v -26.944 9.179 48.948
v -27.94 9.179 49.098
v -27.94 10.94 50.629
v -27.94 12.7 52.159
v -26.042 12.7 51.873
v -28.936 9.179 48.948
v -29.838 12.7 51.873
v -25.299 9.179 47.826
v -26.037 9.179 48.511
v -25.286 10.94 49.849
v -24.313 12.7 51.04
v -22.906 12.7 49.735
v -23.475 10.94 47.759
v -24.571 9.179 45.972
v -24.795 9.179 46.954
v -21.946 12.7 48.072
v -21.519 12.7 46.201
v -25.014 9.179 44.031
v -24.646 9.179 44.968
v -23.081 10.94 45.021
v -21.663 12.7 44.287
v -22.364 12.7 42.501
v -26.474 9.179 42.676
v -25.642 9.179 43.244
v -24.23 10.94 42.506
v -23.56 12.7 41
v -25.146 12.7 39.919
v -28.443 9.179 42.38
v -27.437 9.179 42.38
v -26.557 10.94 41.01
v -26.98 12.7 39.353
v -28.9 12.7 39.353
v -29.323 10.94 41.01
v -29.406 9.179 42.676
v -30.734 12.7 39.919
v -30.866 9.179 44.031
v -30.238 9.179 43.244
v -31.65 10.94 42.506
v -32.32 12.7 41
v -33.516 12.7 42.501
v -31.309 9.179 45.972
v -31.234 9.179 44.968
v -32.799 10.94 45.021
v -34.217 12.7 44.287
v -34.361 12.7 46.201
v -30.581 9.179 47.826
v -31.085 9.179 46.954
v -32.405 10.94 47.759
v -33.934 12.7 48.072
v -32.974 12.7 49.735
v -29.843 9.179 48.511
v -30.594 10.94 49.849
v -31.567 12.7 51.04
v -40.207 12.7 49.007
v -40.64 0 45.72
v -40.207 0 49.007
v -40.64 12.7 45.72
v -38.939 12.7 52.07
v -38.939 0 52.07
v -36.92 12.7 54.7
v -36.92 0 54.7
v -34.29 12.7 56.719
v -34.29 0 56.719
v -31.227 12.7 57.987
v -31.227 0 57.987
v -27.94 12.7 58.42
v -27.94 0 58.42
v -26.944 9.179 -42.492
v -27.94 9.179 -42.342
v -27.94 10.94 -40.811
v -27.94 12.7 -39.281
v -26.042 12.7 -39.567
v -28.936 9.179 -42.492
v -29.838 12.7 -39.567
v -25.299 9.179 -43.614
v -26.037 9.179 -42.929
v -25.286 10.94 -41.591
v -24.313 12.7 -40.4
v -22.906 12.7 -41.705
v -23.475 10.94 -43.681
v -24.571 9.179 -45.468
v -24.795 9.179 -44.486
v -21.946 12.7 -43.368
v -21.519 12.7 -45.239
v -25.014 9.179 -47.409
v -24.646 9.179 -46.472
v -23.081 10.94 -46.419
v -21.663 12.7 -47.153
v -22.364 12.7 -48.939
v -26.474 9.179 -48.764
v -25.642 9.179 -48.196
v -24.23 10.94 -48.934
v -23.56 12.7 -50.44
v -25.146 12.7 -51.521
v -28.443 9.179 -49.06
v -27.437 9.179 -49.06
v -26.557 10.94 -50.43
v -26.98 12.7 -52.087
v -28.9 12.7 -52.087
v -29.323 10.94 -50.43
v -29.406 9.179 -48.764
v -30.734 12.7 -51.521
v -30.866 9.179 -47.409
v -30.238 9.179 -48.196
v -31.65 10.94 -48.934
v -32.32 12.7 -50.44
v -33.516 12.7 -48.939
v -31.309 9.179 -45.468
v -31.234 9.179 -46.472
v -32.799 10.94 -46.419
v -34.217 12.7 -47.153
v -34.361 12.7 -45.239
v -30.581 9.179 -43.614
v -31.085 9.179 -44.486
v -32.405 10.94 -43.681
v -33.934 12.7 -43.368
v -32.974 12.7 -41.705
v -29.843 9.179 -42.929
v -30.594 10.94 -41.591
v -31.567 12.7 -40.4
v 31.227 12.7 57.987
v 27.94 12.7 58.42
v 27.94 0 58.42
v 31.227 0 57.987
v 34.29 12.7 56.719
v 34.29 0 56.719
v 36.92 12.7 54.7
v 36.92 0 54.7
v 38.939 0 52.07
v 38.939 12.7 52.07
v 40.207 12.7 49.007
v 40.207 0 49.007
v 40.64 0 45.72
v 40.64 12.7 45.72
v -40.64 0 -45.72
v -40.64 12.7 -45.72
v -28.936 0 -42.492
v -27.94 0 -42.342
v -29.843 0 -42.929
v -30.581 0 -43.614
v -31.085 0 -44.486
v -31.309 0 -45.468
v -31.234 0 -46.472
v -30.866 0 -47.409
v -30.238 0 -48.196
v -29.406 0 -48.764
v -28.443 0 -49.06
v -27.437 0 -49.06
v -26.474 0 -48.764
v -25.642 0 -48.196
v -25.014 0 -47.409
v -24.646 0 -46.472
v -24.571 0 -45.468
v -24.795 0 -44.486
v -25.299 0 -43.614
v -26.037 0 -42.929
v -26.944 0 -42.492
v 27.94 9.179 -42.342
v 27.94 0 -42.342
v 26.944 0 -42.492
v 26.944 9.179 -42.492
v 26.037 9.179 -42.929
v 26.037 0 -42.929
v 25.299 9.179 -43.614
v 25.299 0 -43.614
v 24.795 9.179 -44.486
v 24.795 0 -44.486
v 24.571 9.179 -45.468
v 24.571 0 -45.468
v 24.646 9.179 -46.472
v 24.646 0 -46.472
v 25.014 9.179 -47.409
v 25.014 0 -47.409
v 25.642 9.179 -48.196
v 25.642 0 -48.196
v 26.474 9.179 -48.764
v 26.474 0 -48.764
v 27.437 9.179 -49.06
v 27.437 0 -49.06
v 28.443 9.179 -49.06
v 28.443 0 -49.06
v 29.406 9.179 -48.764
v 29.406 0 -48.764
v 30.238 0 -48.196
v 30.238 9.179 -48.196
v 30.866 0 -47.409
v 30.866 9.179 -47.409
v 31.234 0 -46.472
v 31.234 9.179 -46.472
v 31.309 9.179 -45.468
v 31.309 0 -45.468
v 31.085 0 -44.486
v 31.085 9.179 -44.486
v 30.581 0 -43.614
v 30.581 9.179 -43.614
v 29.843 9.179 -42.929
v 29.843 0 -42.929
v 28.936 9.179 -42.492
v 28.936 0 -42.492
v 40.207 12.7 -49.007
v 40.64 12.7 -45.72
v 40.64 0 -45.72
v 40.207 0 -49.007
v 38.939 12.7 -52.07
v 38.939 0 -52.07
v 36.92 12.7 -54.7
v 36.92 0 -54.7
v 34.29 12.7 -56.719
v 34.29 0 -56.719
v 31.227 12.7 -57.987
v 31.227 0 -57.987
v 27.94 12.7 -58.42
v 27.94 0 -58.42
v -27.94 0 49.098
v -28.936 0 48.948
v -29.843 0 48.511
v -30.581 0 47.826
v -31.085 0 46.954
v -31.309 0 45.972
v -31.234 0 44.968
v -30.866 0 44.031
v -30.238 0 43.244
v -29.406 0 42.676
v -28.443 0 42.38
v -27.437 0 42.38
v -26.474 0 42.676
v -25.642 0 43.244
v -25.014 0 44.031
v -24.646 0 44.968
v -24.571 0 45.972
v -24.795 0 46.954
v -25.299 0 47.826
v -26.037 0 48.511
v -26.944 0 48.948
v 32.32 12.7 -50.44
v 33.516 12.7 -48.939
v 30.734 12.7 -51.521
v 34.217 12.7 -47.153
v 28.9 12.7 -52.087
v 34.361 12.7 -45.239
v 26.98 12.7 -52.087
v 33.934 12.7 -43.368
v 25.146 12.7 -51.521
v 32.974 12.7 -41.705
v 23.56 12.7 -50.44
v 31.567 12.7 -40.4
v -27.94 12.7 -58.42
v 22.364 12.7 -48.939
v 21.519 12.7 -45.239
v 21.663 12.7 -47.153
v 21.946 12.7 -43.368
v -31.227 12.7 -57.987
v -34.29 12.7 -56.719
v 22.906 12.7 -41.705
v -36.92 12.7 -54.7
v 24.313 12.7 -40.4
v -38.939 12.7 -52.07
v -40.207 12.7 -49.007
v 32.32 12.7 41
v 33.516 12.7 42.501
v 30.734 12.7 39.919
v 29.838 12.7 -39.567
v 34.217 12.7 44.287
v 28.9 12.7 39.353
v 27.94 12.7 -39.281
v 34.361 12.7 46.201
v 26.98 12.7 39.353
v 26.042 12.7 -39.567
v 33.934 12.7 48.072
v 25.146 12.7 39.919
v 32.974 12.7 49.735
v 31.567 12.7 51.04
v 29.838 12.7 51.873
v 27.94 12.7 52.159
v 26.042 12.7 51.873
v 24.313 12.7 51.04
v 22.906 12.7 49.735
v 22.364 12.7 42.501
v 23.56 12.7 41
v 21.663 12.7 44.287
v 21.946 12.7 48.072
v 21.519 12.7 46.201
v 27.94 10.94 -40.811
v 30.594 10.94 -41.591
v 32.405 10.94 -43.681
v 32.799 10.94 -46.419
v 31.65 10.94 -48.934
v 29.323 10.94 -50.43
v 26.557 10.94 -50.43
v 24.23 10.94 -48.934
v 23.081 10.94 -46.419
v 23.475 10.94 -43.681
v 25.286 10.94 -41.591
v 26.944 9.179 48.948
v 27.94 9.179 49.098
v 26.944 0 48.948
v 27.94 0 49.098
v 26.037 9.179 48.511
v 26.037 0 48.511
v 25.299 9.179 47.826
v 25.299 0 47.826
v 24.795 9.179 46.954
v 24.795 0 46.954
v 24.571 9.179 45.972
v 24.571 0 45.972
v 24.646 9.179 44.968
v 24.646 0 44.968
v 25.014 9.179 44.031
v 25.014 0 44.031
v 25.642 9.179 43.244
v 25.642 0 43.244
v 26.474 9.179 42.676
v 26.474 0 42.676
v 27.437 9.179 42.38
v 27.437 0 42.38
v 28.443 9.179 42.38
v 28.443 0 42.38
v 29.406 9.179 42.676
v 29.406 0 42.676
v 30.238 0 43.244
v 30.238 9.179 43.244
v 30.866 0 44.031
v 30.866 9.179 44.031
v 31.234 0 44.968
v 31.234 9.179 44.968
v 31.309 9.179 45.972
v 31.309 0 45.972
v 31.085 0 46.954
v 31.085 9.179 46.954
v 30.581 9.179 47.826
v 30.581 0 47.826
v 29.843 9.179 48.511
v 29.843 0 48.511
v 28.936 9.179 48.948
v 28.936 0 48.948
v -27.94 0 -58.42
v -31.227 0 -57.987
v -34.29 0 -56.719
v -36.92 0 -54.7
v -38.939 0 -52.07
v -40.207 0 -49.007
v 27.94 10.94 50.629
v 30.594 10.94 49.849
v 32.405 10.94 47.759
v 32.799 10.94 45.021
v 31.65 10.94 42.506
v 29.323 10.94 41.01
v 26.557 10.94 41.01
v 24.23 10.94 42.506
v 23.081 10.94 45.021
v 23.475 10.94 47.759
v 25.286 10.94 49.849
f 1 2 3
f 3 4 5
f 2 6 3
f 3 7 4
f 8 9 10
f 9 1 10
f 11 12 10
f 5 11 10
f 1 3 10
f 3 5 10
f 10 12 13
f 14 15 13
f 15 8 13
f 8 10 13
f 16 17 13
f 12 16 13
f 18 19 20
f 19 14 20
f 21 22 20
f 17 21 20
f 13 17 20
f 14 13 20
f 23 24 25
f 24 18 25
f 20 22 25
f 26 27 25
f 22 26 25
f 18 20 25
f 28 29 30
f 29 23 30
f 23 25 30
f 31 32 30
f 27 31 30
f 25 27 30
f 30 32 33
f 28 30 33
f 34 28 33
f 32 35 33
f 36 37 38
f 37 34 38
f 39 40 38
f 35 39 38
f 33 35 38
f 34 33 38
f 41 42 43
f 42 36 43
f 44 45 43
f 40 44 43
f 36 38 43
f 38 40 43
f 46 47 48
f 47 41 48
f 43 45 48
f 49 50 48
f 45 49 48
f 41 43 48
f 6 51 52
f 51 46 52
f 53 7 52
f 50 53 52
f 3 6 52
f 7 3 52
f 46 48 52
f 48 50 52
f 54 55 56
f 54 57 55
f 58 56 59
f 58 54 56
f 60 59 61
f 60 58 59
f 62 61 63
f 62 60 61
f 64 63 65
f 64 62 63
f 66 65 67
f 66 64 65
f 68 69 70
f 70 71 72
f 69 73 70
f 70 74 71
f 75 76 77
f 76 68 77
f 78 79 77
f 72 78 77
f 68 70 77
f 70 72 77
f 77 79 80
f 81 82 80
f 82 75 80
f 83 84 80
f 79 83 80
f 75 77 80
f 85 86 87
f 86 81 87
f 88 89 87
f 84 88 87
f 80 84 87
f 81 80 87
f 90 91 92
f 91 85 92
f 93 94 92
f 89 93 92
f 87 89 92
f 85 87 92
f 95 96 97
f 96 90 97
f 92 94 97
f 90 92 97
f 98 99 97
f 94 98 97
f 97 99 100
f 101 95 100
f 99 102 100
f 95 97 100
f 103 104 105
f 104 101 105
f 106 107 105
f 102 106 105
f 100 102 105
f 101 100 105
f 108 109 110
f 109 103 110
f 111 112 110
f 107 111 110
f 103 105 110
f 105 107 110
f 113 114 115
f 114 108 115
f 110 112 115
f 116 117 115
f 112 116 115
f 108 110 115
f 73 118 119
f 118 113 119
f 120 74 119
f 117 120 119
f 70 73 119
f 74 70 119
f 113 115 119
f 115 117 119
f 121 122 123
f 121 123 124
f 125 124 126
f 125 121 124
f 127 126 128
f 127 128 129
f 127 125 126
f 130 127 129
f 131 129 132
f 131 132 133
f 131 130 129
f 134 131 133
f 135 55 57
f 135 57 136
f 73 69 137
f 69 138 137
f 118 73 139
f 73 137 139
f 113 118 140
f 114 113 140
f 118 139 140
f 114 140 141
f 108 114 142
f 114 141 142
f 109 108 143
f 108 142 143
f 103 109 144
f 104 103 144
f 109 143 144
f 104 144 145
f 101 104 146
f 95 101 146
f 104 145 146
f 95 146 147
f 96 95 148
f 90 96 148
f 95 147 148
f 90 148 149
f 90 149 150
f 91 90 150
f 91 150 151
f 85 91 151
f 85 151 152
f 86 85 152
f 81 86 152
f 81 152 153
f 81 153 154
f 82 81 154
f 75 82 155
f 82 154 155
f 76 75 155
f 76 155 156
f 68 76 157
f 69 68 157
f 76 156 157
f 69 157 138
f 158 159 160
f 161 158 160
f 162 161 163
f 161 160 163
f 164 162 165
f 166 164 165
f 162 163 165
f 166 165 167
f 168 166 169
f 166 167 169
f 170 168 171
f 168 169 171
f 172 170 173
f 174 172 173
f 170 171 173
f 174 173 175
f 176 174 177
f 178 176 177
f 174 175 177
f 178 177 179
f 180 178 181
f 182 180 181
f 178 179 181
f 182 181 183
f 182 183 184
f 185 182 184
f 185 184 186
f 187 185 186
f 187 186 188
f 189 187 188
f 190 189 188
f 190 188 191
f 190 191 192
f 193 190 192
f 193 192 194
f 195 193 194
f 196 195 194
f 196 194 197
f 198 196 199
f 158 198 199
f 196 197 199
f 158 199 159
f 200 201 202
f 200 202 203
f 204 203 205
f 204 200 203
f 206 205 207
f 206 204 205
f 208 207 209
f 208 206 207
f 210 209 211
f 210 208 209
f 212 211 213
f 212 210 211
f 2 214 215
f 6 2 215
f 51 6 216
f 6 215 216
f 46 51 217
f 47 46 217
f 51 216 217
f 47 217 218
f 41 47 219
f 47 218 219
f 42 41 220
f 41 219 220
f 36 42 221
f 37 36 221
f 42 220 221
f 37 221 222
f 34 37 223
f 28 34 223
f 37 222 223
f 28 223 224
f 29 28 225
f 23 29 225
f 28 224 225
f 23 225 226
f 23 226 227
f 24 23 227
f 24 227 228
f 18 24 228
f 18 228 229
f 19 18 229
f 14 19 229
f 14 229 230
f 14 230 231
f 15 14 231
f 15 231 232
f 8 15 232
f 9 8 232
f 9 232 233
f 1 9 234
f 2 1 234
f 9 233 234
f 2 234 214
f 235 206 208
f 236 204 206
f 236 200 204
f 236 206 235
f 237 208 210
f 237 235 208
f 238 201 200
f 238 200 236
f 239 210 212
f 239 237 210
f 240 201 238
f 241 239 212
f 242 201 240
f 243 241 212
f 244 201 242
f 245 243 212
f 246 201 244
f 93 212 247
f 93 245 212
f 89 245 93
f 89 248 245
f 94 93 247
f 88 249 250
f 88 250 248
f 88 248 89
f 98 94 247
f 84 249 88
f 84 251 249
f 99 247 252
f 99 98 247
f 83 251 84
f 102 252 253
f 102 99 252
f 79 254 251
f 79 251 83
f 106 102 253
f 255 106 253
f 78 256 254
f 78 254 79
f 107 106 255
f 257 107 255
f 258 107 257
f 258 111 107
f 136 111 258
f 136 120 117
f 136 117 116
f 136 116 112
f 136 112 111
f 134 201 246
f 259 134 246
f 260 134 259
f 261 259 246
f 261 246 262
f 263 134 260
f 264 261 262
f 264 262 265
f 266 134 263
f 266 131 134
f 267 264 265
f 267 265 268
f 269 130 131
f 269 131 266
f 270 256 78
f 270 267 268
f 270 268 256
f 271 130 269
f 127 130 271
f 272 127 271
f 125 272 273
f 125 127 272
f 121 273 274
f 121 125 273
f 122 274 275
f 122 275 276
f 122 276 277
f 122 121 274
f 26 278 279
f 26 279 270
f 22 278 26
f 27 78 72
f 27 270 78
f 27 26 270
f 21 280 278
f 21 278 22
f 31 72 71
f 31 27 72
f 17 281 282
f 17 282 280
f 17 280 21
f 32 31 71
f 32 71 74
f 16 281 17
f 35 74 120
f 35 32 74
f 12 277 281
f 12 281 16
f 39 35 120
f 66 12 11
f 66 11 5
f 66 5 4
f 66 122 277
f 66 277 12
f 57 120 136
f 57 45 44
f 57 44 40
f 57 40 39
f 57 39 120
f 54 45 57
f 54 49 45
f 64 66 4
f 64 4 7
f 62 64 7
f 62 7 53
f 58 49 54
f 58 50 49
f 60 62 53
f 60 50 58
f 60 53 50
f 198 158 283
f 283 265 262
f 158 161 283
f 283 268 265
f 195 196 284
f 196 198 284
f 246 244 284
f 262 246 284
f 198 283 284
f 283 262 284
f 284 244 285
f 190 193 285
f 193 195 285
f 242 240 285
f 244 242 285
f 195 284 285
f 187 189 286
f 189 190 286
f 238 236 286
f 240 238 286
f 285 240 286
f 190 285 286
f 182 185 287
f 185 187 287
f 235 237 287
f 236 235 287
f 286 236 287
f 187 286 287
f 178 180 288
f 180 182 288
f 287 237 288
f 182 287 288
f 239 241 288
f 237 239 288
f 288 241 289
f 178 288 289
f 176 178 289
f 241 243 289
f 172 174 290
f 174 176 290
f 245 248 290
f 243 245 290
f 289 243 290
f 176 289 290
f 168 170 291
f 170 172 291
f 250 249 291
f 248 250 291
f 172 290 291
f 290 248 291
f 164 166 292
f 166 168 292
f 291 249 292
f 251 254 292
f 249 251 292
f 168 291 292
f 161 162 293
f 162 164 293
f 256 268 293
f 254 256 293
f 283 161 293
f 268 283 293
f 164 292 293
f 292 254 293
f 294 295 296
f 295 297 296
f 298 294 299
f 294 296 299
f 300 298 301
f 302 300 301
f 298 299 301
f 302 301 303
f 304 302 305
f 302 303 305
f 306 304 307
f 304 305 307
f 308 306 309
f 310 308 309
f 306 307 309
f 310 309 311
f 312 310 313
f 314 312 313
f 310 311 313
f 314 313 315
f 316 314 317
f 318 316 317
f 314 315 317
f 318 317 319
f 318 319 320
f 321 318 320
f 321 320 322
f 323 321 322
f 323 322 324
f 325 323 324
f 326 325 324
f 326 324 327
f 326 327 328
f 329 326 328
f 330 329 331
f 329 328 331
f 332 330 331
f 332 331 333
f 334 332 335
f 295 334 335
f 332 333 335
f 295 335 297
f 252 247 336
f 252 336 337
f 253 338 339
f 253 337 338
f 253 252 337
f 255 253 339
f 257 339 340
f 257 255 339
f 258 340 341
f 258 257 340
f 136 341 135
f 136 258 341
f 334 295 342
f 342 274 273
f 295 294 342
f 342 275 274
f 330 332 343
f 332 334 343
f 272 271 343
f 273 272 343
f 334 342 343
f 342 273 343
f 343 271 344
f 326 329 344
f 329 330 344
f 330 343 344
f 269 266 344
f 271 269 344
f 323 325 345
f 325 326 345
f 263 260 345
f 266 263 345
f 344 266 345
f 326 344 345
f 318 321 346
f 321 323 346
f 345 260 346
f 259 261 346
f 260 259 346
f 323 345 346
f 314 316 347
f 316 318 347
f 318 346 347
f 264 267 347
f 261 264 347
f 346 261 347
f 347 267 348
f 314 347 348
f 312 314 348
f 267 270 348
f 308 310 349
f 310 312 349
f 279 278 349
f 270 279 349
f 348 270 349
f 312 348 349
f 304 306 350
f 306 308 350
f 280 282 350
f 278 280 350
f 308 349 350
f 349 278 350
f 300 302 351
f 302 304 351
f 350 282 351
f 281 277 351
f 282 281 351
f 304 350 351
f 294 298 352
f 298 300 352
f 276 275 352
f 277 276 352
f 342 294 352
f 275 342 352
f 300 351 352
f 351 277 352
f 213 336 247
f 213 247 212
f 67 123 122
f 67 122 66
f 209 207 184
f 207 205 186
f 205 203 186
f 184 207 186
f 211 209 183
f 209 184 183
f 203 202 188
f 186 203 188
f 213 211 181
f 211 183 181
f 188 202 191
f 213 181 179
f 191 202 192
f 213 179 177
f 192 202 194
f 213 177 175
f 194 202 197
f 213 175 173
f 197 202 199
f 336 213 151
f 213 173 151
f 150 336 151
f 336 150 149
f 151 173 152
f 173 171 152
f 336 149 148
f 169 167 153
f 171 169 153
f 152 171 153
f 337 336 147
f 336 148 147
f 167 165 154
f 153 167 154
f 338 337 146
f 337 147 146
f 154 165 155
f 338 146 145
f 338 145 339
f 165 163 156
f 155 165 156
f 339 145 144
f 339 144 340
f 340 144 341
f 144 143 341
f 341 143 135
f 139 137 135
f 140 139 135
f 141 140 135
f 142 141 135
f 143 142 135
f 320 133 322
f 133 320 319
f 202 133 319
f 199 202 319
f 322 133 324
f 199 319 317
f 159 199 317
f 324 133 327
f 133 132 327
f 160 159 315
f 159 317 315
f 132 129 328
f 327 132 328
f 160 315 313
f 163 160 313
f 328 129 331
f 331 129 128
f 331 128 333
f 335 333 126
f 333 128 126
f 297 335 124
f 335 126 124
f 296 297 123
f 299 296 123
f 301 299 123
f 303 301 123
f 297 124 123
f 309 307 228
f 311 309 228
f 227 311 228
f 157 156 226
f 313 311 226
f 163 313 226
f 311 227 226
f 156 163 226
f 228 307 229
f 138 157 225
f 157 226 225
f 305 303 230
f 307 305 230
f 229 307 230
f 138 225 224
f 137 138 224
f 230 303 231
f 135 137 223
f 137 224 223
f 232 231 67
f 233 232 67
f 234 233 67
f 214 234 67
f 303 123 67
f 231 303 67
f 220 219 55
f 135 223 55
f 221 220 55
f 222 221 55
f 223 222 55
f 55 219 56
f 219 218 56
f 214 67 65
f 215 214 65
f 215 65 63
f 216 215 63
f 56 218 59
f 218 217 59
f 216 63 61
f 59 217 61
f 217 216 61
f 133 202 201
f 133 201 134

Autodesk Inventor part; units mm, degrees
ref_plane "YZ Plane" through (0, 0, 0) normal (1, 0, 0) x (0, 1, 0)
ref_plane "XZ Plane" through (0, 0, 0) normal (0, 1, 0) x (-1, 0, 0)
ref_plane "XY Plane" through (0, 0, 0) normal (0, 0, 1) x (1, 0, 0)
sketch "Sketch1" plane through (0, 0, 0) normal (0, 1, 0) x (-1, 0, 0)
  line L0 (-40.64, 58.42) -> (40.64, 58.42)
  line L1 (40.64, 58.42) -> (40.64, -58.42)
  line L2 (40.64, -58.42) -> (-40.64, -58.42)
  line L3 (-40.64, -58.42) -> (-40.64, 58.42)
  point P0 (0, 0)
  point P1 (0, 58.42)
  point P2 (40.64, 0)
  dimension "d0" = 81.28
  dimension "d1" = 116.84
extrude "Extrusion1" add sketch "Sketch1" along normal blind 12.7
fillet "Fillet1" radius 12.7 4 edges at (-40.64, 6.35, 58.42) (-40.64, 6.35, -58.42) (40.64, 6.35, 58.42) (40.64, 6.35, -58.42)
sketch "Sketch2" plane through (0, 12.7, 0) normal (0, 1, 0) x (1, 0, 0)
  arc A0 (-27.94, 58.42) -> (-40.64, 45.72) centre (-27.94, 45.72) ccw projected
  point P0 (0, 0)
hole "Hole1" at (-27.94, 12.7, -45.72) direction (0, -1, 0) diameter 6.7564 end through all countersink diameter 12.8778 countersink angle 82 clearance for "Flat Head Machine Screw (82)" size "1/4" standard "Ansi Unified Screw Threads"
sketch "Sketch3" plane through (0, 12.7, 0) normal (0, 1, 0) x (1, 0, 0)
  arc A0 (-40.64, -45.72) -> (-27.94, -58.42) centre (-27.94, -45.72) ccw projected
  point P0 (0, 0)
hole "Hole2" at (-27.94, 12.7, 45.72) direction (0, -1, 0) diameter 6.7564 end through all countersink diameter 12.8778 countersink angle 82 clearance for "Flat Head Machine Screw (82)" size "1/4" standard "Ansi Unified Screw Threads"
sketch "Sketch4" plane through (0, 12.7, 0) normal (0, 1, 0) x (1, 0, 0)
  arc A0 (27.94, -58.42) -> (40.64, -45.72) centre (27.94, -45.72) ccw projected
  point P0 (0, 0)
hole "Hole3" at (27.94, 12.7, 45.72) direction (0, -1, 0) diameter 6.7564 end through all countersink diameter 12.8778 countersink angle 82 clearance for "Flat Head Machine Screw (82)" size "1/4" standard "Ansi Unified Screw Threads"
sketch "Sketch5" plane through (0, 12.7, 0) normal (0, 1, 0) x (1, 0, 0)
  arc A0 (40.64, 45.72) -> (27.94, 58.42) centre (27.94, 45.72) ccw projected
  point P0 (0, 0)
hole "Hole4" at (27.94, 12.7, -45.72) direction (0, -1, 0) diameter 6.7564 end through all countersink diameter 12.8778 countersink angle 82 clearance for "Flat Head Machine Screw (82)" size "1/4" standard "Ansi Unified Screw Threads"
properties part number "Base plate"
